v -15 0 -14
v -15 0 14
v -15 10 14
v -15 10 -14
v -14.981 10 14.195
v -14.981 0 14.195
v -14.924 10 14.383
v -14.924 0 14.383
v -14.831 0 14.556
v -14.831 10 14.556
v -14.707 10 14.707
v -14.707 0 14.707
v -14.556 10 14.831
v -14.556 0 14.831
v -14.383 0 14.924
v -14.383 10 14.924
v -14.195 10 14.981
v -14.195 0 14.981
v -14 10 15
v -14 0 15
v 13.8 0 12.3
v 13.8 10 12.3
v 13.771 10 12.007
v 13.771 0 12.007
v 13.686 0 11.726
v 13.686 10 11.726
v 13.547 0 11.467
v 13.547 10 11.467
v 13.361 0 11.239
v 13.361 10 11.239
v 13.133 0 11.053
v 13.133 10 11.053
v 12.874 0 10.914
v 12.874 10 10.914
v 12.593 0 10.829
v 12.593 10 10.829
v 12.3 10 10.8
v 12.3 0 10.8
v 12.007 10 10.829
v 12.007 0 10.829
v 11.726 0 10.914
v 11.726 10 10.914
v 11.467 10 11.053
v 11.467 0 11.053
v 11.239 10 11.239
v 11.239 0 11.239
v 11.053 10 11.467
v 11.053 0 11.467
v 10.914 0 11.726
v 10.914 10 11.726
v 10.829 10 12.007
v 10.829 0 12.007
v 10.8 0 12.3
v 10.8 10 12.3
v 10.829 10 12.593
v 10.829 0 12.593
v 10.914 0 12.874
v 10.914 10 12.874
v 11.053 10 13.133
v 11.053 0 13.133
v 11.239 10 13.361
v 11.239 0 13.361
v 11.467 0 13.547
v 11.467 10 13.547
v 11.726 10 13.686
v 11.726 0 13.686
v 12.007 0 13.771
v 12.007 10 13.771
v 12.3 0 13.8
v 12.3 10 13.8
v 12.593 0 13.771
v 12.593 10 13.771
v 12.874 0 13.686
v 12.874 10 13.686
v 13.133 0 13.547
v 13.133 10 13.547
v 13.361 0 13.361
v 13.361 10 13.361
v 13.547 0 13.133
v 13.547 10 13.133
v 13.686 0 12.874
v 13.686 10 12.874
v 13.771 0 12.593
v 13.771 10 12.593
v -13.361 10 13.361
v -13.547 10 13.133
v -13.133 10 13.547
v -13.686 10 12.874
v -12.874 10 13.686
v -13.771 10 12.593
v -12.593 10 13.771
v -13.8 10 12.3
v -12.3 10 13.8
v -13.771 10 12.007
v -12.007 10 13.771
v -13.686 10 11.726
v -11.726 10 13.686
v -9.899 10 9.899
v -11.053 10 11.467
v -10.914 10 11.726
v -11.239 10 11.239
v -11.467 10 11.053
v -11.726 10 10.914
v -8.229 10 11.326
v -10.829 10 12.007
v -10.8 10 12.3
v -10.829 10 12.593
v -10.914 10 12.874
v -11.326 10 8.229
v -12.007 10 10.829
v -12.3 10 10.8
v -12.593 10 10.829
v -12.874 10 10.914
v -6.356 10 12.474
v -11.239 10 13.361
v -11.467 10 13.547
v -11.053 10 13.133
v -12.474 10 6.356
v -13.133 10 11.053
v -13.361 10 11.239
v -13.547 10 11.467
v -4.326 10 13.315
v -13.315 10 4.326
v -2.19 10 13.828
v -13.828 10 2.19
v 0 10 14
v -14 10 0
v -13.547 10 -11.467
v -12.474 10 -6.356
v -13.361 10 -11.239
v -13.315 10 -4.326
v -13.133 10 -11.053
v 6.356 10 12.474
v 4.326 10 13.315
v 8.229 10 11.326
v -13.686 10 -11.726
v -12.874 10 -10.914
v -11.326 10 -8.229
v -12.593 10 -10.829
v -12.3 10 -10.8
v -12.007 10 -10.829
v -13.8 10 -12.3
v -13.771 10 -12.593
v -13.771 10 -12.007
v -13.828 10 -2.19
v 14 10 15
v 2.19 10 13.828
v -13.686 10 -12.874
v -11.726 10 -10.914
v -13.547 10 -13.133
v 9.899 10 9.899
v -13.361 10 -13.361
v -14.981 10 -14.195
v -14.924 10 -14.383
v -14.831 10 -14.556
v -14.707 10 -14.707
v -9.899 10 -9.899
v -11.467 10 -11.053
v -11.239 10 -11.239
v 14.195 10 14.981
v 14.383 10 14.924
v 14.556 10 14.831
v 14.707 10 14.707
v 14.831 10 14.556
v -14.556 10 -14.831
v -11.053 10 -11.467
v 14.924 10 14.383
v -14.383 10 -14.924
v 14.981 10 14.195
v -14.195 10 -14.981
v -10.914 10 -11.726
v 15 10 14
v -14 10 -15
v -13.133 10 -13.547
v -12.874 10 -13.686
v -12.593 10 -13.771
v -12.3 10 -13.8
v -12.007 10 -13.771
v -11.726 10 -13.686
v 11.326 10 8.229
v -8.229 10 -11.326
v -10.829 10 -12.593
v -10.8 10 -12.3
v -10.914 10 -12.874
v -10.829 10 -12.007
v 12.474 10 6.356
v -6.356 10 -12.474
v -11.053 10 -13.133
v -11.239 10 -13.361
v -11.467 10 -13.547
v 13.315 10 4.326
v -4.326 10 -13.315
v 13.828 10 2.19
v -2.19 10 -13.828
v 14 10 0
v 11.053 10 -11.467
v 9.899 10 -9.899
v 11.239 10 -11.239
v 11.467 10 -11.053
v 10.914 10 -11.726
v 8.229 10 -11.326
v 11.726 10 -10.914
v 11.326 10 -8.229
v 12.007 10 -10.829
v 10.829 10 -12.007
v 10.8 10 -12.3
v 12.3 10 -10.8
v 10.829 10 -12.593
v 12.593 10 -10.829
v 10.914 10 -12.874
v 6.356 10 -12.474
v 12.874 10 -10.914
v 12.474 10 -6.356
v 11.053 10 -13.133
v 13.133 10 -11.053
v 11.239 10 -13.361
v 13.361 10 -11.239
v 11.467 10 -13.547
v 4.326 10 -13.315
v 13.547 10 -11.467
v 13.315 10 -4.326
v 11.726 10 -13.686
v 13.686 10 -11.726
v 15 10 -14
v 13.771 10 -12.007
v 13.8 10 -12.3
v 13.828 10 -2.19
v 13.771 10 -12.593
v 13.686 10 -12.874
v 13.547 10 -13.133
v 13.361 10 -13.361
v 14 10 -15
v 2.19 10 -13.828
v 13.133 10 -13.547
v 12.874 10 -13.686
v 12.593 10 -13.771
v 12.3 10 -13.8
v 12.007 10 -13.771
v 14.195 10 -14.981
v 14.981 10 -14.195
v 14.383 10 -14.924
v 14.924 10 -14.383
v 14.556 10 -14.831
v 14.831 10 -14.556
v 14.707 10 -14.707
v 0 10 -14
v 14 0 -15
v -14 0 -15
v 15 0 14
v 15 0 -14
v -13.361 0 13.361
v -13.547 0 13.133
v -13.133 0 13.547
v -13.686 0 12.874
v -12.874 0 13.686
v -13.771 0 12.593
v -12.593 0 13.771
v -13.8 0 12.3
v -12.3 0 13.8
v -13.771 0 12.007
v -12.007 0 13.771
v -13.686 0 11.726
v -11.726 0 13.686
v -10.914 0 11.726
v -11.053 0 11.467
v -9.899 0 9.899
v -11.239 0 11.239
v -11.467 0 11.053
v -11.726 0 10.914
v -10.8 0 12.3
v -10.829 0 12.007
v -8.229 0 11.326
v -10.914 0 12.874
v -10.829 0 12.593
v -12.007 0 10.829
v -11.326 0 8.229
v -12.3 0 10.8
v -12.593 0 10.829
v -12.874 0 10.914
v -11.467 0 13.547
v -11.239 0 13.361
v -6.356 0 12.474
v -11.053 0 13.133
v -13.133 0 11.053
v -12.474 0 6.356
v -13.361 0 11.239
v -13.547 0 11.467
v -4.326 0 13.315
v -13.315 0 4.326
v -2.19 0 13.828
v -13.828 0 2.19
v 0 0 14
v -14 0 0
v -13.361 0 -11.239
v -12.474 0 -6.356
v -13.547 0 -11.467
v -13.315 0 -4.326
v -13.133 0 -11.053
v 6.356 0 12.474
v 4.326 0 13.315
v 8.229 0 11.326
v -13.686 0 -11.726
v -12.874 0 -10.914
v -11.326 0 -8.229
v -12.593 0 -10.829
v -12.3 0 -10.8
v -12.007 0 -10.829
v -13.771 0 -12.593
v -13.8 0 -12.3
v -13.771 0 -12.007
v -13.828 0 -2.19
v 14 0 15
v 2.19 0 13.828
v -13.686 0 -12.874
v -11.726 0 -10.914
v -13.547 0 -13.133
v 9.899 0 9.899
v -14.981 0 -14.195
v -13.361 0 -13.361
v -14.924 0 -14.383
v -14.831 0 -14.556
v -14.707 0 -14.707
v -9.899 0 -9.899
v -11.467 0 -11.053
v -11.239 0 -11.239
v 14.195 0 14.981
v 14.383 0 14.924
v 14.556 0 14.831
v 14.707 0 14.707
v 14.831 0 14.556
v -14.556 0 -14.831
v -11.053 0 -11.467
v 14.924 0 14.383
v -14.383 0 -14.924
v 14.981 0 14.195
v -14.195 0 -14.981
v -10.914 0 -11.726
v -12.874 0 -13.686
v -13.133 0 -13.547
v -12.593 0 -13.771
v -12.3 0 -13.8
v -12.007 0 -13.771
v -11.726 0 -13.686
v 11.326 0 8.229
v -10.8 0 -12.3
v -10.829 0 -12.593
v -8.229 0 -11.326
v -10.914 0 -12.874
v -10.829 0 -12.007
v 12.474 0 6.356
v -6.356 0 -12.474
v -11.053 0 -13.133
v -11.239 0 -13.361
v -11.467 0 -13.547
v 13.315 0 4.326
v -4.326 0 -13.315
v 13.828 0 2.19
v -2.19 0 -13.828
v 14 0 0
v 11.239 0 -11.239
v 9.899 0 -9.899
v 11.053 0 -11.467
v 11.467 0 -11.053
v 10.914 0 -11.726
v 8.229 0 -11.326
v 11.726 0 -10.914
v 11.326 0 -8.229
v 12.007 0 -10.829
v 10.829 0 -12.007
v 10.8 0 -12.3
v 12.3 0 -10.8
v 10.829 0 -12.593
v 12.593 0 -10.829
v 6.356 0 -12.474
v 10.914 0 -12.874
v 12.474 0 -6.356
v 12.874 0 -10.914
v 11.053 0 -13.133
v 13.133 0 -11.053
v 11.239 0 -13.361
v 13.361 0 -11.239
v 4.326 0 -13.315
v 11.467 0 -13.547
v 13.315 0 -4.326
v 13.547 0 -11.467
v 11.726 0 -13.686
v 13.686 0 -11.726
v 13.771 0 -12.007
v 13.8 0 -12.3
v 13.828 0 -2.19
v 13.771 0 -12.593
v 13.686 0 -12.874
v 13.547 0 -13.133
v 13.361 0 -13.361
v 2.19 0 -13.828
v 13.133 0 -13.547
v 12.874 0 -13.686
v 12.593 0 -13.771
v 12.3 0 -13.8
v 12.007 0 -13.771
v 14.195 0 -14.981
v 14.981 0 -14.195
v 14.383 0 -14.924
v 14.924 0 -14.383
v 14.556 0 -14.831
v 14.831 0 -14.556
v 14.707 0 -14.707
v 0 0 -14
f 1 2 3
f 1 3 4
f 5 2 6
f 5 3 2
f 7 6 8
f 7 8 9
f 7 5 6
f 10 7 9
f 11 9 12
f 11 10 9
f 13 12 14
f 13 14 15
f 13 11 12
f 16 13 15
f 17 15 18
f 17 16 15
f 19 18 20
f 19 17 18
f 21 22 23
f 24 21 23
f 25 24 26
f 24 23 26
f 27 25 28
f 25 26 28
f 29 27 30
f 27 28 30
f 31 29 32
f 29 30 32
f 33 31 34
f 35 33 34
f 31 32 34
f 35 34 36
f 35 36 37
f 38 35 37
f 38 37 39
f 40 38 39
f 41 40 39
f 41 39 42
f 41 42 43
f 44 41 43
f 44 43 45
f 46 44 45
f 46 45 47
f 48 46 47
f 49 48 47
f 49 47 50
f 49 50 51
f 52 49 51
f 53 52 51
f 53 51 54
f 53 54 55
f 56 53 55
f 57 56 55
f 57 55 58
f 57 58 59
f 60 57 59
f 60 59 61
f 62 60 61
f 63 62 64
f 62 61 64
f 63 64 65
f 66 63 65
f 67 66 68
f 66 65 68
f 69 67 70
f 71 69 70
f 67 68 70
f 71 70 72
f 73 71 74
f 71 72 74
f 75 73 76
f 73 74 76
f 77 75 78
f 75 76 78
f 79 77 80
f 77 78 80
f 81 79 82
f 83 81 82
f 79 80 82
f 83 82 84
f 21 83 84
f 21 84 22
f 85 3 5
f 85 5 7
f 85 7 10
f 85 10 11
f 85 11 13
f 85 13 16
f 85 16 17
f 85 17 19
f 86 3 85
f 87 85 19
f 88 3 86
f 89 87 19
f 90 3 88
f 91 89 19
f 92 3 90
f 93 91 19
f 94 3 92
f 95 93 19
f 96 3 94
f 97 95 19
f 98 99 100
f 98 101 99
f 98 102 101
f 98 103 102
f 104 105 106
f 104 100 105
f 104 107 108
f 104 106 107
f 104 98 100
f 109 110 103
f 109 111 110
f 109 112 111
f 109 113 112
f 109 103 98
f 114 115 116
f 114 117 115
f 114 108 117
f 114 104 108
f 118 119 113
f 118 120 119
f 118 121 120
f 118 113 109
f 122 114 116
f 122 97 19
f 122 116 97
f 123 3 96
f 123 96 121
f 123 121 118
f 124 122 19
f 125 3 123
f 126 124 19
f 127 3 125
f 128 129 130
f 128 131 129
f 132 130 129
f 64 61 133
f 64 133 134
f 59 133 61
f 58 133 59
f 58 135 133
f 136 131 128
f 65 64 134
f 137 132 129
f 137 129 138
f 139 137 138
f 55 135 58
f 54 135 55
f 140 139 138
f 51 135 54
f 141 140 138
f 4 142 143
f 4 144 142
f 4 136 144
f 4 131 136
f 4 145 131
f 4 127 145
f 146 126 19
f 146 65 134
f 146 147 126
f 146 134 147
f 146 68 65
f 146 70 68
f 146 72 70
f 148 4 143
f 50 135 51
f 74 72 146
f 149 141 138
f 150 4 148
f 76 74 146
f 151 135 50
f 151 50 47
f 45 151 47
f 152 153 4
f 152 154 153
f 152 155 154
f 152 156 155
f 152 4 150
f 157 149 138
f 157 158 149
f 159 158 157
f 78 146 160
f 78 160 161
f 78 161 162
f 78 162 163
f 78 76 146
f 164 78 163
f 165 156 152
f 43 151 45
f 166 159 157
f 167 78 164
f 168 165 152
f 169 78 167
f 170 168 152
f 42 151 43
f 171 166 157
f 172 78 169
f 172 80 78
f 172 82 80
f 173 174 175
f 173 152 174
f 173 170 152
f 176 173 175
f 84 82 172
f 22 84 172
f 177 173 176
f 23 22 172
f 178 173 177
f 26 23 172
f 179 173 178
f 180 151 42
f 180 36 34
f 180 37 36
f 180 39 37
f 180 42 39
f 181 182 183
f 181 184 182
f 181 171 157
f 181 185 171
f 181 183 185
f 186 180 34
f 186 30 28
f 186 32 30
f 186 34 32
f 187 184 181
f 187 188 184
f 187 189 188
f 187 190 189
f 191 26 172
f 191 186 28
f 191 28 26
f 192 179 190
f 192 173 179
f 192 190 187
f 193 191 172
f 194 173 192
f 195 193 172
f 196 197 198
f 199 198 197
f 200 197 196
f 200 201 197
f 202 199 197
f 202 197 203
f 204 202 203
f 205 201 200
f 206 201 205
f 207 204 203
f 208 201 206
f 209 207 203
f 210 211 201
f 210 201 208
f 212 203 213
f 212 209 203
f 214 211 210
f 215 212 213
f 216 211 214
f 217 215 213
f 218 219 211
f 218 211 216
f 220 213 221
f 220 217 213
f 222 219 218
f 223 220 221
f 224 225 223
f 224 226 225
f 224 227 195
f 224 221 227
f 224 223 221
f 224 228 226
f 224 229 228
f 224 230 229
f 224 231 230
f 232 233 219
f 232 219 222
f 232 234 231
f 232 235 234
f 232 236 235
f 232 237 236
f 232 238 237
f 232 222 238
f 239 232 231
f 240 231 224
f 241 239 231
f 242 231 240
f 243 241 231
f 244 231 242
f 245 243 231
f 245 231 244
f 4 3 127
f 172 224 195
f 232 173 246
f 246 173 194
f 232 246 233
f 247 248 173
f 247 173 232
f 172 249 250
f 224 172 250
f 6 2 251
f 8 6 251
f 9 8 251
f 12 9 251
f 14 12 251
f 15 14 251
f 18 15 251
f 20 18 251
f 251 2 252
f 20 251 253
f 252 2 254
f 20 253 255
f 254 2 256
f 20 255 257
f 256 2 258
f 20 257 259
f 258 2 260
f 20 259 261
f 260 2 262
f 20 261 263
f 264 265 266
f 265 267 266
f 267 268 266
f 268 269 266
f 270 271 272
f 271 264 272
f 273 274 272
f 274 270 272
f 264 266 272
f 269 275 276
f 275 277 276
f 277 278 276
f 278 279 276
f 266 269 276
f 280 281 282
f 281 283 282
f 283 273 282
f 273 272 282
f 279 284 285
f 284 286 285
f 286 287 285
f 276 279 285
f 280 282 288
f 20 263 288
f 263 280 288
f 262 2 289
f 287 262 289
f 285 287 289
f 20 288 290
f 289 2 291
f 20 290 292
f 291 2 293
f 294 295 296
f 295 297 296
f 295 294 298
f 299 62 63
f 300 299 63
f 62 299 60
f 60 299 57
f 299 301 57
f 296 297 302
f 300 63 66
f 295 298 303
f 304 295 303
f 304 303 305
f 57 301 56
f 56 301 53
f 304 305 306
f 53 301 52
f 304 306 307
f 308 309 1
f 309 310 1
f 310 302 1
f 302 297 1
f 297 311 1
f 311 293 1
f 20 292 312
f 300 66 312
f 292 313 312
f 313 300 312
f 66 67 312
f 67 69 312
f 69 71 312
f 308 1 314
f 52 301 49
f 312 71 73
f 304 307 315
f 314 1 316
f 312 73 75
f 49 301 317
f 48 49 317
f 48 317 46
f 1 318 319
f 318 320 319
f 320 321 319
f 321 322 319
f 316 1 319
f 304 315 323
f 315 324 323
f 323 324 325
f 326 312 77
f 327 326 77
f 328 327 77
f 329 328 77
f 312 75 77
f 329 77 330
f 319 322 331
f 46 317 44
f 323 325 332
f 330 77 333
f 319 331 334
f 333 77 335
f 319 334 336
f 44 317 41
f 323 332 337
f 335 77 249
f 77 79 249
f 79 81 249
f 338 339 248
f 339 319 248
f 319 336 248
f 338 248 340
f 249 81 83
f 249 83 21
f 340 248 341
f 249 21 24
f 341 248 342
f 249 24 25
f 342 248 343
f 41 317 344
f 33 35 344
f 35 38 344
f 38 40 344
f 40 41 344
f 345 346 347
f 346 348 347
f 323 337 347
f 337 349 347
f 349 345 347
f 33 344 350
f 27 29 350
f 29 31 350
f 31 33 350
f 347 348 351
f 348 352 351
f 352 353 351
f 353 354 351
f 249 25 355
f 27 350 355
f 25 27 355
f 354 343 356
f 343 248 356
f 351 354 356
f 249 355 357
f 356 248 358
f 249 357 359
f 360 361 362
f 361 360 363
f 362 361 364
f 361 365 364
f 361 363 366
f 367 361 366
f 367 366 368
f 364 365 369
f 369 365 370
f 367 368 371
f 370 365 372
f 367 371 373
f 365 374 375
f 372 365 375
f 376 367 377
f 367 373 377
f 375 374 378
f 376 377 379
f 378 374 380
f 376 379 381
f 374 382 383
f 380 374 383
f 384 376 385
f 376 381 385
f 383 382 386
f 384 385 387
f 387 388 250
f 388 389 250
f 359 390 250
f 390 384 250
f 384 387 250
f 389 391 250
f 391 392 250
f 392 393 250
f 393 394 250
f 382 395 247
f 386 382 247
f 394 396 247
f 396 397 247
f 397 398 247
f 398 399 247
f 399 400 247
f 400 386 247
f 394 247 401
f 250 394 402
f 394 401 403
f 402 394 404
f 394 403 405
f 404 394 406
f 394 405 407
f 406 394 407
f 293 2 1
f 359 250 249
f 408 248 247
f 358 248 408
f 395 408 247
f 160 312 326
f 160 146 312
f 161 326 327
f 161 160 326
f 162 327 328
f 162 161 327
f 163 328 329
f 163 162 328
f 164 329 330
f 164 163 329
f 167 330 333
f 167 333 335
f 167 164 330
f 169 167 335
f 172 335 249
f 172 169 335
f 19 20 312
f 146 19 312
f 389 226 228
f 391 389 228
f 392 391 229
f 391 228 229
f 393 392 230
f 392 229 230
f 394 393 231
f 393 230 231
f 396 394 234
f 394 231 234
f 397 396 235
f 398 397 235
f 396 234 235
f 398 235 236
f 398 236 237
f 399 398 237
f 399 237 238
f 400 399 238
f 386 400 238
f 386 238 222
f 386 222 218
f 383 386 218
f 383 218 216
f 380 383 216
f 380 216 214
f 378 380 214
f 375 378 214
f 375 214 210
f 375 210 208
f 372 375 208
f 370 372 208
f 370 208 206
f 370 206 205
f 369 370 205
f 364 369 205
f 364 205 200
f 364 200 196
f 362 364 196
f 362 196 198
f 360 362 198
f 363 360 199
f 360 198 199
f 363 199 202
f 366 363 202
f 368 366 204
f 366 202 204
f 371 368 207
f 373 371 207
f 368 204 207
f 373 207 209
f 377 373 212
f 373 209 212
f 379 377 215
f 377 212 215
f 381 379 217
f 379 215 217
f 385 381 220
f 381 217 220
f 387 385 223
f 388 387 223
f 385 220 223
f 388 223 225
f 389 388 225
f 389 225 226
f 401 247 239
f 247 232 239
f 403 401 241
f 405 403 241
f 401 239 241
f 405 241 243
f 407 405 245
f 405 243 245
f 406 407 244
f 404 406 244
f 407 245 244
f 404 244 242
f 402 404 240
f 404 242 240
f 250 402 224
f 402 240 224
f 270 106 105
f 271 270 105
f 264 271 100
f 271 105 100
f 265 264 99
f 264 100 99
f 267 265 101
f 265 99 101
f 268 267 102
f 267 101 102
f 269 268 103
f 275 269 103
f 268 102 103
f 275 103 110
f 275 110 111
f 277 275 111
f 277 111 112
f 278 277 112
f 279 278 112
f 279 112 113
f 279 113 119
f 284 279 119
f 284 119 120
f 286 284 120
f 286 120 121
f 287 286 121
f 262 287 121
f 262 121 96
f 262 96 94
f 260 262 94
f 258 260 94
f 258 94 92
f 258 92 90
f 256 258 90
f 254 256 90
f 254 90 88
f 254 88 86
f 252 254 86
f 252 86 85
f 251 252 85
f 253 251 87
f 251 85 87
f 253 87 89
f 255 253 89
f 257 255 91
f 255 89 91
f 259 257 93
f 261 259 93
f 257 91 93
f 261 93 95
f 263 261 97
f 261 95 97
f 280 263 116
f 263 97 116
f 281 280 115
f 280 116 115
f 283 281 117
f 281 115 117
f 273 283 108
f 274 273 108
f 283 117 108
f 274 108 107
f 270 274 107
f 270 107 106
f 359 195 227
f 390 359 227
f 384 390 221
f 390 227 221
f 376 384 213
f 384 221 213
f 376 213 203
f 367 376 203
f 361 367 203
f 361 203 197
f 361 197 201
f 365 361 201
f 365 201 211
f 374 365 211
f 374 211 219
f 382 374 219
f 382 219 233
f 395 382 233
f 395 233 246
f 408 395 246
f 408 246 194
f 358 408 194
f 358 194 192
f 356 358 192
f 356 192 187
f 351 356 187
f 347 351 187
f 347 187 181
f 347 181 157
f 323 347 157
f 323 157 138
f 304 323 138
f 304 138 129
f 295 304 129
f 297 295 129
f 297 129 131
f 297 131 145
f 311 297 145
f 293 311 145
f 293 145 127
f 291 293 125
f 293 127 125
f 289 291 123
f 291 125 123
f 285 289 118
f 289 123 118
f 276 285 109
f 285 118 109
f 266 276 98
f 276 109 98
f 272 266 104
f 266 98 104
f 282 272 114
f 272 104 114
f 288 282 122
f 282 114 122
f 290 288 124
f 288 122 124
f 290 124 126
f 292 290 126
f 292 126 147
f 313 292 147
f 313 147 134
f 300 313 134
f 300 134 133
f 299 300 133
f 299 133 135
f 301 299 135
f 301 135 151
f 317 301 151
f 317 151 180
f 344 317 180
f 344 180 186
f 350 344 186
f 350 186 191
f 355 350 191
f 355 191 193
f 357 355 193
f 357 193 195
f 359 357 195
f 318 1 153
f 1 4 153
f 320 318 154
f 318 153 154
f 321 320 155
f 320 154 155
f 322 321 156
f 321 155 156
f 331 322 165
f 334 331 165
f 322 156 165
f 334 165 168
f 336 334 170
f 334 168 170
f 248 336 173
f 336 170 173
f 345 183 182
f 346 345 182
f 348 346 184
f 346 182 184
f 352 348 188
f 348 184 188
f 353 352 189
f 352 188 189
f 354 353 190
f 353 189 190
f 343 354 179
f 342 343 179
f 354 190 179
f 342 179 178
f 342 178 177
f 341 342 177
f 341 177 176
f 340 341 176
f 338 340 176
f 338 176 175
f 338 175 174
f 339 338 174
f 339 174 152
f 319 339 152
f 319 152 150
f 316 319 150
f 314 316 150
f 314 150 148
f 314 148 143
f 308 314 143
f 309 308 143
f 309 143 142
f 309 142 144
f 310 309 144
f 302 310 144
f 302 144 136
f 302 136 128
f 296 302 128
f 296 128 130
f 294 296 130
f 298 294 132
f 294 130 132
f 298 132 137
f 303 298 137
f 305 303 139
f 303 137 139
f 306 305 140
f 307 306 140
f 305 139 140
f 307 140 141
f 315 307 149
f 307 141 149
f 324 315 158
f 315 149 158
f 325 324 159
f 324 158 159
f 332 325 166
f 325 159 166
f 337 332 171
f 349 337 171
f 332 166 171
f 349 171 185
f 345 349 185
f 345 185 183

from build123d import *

# Parameters (mm, degrees)
SKETCH_1_W          = 30
SKETCH_1_H          = 30
EXTRUDE_1_DEPTH     = 10
SKETCH_2_R          = 1.5
CUT_EXTRUDE_1_DEPTH = 11
FILLET_1_R          = 1
SKETCH_3_R          = 14
CUT_EXTRUDE_2_DEPTH = 11


with BuildPart() as part:
    # 草图1 → 凸台-拉伸1 (new body)
    with BuildSketch(Plane(origin=(0, 0, 0), x_dir=(1, 0, 0), z_dir=(0, 1, 0))):
        Rectangle(SKETCH_1_W, SKETCH_1_H)
    extrude(amount=EXTRUDE_1_DEPTH)

    # 草图2 → 切除-拉伸1 (cut, through all)
    with BuildSketch(Plane(origin=(0, 10, 0), x_dir=(1, 0, 0), z_dir=(0, 1, 0))):
        with Locations((-12.3, 12.3)):
            Circle(SKETCH_2_R)
        with Locations((12.3, 12.3)):
            Circle(SKETCH_2_R)
        with Locations((-12.3, -12.3)):
            Circle(SKETCH_2_R)
        with Locations((12.3, -12.3)):
            Circle(SKETCH_2_R)
    extrude(amount=-CUT_EXTRUDE_1_DEPTH, mode=Mode.SUBTRACT)

    # 圆角1
    fillet_1_edges = [part.edges().sort_by_distance(p)[0] for p in [
        (15, 5, 15),
        (-15, 5, 15),
        (-15, 5, -15),
        (15, 5, -15),
    ]]
    fillet(fillet_1_edges, radius=FILLET_1_R)

    # 草图3 → 切除-拉伸2 (cut, through all)
    with BuildSketch(Plane(origin=(0, 10, 0), x_dir=(1, 0, 0), z_dir=(0, 1, 0))):
        Circle(SKETCH_3_R)
    extrude(amount=-CUT_EXTRUDE_2_DEPTH, mode=Mode.SUBTRACT)


solid = part.part
